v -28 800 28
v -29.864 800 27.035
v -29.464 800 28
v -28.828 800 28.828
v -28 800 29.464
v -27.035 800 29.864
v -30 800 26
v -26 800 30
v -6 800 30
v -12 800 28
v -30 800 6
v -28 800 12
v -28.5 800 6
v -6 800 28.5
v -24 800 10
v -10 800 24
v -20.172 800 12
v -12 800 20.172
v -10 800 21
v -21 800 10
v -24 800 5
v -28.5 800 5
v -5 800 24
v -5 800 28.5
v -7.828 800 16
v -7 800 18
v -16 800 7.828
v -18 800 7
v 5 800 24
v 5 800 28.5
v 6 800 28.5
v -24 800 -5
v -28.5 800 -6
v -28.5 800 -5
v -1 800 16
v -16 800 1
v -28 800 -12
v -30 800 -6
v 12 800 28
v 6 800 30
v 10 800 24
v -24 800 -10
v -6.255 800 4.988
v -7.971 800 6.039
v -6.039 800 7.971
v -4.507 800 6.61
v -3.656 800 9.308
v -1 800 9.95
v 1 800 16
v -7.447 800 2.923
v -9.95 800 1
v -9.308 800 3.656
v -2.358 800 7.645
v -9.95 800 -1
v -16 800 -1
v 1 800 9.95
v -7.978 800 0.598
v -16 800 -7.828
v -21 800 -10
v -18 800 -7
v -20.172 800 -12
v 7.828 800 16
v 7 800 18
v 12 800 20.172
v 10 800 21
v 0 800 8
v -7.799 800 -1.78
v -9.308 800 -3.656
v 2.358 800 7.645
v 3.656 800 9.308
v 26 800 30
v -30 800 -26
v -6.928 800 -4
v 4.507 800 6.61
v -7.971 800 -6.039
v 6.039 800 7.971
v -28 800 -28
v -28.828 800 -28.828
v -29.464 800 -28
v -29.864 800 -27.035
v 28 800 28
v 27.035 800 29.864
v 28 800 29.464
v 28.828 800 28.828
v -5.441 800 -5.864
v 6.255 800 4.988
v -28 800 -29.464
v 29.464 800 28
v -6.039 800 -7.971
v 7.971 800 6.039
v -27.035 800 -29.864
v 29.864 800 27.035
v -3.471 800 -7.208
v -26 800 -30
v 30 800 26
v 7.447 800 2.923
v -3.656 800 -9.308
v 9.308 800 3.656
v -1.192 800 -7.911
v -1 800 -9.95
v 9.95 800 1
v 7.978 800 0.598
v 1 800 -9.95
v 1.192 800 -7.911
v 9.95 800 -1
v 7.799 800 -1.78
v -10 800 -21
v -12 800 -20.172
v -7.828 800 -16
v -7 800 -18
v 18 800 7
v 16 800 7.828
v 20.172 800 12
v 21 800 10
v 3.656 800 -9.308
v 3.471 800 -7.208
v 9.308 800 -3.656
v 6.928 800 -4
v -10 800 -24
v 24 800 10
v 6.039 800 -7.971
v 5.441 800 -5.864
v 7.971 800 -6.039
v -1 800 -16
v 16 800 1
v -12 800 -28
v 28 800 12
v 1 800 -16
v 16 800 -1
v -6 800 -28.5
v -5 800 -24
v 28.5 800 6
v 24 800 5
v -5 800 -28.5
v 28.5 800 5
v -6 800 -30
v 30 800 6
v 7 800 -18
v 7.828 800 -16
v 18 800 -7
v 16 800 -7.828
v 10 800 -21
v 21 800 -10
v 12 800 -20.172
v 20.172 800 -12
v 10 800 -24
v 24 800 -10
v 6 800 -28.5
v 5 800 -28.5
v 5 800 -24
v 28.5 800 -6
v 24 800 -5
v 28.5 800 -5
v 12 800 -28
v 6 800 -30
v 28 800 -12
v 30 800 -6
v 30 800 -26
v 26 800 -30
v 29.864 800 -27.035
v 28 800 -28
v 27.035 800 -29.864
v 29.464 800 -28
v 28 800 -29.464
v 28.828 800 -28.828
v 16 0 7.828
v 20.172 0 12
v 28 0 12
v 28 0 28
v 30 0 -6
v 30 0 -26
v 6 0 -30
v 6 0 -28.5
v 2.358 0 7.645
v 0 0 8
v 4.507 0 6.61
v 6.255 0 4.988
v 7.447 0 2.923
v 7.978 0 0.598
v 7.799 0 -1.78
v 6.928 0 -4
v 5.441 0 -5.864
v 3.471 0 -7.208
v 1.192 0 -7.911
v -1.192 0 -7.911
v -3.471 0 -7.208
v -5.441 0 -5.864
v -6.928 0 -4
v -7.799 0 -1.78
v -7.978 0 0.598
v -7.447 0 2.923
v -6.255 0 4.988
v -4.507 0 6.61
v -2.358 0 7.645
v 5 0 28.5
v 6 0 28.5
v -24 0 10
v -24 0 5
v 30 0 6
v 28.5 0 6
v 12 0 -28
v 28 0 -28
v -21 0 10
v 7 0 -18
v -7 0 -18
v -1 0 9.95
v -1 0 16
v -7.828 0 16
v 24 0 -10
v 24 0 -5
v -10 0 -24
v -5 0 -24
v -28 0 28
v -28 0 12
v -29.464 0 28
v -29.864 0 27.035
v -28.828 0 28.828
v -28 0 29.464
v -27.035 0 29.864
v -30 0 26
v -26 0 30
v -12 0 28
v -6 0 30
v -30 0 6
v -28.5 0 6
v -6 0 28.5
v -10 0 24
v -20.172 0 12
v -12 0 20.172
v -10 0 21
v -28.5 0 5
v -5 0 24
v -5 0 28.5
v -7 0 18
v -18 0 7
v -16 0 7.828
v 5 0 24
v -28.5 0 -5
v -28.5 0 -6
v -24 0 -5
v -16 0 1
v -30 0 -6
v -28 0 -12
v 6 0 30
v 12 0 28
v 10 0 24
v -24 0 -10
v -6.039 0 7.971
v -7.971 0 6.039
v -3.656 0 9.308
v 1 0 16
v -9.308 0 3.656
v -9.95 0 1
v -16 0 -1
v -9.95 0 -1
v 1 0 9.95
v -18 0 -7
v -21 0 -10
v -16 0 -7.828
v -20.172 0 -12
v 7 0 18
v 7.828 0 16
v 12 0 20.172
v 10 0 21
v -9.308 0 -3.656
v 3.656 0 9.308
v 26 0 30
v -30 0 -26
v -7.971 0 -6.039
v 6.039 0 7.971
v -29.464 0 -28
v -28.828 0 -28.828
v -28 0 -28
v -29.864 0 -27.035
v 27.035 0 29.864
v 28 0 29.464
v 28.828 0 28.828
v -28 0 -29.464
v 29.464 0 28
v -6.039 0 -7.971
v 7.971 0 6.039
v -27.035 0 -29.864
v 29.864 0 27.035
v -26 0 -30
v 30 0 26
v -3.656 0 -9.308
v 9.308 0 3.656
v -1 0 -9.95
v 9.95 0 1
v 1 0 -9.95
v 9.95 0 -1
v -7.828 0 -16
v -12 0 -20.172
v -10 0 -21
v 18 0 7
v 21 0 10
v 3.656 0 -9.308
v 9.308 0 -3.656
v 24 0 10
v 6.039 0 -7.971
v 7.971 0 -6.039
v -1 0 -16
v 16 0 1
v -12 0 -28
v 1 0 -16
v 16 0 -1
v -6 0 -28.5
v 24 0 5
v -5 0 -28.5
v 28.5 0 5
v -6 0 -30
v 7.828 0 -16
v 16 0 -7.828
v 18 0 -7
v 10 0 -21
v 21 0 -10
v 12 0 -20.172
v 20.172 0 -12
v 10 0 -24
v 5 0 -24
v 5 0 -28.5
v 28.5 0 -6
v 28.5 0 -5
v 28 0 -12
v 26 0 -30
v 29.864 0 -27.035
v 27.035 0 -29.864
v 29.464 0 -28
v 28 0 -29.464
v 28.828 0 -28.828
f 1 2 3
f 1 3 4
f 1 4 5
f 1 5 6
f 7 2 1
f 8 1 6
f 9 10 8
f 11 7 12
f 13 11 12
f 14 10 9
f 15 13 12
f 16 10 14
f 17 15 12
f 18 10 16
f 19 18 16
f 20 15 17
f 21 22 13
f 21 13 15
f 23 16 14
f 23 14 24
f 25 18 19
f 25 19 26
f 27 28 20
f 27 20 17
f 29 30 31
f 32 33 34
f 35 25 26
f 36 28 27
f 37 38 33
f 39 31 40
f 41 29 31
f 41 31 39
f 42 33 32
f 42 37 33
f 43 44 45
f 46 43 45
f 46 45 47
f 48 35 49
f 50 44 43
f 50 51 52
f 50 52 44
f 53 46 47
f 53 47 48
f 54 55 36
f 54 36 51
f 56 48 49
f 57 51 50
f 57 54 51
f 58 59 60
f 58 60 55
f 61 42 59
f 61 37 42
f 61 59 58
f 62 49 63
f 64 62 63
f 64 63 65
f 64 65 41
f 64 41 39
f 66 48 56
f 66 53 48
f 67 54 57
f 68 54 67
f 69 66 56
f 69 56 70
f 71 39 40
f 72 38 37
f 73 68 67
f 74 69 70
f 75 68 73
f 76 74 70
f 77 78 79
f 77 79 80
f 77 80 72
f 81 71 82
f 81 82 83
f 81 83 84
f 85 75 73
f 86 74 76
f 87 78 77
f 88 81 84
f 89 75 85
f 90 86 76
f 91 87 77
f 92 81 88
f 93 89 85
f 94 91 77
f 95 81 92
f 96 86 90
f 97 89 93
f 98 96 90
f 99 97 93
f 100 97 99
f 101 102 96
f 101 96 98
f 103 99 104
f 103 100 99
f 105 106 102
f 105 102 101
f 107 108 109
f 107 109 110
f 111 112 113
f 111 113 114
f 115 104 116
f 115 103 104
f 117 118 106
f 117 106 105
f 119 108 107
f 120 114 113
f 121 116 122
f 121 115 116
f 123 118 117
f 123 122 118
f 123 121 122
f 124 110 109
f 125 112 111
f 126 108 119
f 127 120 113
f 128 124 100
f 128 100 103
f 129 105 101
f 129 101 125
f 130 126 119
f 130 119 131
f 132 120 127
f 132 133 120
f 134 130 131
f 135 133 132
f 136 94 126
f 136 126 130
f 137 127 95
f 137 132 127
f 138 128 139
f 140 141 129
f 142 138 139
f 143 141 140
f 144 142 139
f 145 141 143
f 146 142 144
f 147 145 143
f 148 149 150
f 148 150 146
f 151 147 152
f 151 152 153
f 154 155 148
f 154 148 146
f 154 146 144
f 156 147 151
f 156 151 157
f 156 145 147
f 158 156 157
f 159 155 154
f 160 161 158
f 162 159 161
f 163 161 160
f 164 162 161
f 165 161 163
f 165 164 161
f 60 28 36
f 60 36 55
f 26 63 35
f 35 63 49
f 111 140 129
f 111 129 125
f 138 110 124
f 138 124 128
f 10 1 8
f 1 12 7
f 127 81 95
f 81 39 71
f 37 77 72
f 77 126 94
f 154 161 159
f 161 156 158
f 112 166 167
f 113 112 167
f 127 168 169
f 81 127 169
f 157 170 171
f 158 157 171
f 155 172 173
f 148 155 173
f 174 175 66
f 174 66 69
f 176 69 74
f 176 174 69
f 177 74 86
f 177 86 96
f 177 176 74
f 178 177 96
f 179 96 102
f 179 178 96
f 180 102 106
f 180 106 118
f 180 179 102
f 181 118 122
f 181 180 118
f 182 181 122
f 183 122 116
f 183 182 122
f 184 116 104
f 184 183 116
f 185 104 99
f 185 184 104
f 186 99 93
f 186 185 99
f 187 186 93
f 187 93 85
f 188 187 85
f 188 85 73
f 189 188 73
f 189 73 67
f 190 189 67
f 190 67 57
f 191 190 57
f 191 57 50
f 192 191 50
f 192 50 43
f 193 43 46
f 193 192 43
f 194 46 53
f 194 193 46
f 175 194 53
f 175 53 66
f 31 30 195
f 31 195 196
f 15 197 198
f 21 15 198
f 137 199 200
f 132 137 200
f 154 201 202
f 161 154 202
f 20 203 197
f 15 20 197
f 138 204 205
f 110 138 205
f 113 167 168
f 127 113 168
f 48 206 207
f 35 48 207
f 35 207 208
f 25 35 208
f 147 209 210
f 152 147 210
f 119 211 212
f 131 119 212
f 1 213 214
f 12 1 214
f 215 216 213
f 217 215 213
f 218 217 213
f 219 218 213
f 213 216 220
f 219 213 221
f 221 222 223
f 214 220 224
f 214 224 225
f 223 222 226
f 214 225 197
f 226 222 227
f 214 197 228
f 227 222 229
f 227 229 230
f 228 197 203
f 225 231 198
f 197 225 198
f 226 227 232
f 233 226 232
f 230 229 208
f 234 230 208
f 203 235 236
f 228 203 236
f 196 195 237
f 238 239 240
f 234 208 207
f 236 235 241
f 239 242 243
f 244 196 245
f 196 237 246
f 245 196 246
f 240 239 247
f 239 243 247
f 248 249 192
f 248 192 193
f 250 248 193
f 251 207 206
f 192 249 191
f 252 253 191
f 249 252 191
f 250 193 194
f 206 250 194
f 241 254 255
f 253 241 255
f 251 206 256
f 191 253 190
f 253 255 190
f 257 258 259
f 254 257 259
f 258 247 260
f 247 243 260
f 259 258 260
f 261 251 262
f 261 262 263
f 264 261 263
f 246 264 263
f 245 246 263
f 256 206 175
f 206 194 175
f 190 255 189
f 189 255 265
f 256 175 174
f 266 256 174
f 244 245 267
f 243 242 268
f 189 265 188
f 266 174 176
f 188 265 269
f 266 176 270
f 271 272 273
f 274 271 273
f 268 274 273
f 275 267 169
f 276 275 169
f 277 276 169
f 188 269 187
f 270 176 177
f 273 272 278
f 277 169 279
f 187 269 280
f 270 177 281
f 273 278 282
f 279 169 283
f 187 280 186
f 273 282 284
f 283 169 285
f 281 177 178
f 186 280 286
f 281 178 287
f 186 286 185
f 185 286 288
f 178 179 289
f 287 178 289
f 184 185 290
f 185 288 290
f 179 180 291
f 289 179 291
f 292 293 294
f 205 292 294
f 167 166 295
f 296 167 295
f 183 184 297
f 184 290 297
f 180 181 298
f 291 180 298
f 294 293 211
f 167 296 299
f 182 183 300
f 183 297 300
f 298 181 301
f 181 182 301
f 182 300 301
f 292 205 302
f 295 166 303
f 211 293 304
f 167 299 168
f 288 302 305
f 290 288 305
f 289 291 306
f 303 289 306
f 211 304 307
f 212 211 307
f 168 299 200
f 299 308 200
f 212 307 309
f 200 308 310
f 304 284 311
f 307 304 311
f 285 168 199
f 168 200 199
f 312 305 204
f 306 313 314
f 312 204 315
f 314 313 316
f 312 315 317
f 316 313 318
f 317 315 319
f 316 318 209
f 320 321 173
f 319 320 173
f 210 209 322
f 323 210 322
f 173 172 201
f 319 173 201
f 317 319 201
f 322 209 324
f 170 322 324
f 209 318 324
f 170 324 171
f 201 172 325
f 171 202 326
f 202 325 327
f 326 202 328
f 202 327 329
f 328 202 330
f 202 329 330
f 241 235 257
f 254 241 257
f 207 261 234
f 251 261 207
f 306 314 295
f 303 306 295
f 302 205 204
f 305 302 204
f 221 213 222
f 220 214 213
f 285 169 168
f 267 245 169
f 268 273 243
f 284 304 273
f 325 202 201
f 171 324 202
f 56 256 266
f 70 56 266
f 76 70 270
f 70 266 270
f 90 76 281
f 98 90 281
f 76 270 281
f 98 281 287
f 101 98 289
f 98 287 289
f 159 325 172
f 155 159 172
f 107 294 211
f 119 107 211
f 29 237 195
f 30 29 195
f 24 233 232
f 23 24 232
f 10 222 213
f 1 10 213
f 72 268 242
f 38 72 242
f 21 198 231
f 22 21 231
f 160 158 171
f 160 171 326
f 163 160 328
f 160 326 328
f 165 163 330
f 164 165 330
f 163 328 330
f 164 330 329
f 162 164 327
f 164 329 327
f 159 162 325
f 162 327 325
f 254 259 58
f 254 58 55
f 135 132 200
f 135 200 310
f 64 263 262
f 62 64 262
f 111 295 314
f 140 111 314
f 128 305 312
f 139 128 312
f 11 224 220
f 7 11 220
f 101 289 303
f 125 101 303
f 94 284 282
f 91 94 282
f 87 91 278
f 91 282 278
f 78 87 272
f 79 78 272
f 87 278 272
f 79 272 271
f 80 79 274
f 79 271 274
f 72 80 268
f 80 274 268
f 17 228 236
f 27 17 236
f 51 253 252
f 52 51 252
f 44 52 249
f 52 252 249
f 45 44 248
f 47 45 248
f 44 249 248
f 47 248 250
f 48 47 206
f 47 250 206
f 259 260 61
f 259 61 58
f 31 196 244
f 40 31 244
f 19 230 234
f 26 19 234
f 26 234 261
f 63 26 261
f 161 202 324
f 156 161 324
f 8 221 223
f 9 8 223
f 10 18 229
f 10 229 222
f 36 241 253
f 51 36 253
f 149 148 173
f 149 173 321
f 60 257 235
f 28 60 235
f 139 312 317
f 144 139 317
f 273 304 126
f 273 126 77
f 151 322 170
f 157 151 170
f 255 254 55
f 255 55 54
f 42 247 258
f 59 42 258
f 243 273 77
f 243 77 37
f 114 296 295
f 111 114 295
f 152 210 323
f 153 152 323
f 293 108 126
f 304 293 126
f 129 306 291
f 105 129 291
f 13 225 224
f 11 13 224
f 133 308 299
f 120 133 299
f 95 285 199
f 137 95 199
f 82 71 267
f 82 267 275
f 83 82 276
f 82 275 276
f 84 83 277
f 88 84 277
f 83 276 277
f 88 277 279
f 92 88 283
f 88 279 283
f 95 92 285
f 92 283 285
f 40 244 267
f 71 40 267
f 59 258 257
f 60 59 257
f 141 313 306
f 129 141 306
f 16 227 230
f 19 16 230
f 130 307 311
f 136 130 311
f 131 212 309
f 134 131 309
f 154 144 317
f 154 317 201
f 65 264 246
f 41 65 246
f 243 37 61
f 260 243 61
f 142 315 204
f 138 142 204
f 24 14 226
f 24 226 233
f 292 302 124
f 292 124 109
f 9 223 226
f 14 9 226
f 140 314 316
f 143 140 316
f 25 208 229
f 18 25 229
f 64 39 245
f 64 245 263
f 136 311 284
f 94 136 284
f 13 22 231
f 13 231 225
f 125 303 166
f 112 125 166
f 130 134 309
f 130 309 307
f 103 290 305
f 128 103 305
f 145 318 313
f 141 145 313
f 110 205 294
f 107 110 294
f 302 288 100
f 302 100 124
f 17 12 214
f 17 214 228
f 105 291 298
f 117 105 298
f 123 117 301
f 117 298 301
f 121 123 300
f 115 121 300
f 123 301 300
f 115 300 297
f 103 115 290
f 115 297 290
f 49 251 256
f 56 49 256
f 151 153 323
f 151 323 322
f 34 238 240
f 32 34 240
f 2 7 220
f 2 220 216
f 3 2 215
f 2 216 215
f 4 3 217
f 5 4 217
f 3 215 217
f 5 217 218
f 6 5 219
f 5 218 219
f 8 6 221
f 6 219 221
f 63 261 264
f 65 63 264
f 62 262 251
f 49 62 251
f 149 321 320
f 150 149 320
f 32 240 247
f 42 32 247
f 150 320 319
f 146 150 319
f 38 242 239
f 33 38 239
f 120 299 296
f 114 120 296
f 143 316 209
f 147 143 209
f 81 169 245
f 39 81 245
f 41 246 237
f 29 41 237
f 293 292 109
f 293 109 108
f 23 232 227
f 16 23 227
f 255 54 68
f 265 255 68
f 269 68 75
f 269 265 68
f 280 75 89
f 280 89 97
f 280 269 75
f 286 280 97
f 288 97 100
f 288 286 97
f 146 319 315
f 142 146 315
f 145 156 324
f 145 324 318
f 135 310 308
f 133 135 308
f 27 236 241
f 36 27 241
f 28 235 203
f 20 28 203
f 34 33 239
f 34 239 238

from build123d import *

# Parameters (mm, degrees)
SKETCH_1_R      = 8
EXTRUDE_1_DEPTH = 800


with BuildPart() as part:
    # 草图1 → 凸台-拉伸1 (new body)
    with BuildSketch(Plane(origin=(0, 0, 0), x_dir=(1, 0, 0), z_dir=(0, 1, 0))):
        with BuildLine():
            Line((-30, 5.999999999), (-28.5, 5.999999999))
            Line((-28.5, 5.999999999), (-28.5, 4.999999999))
            Line((-28.5, 4.999999999), (-24, 4.999999999))
            Line((-24, 4.999999999), (-24, 9.999999999))
            Line((-24, 9.999999999), (-21, 9.999999999))
            Line((-21, 9.999999999), (-18, 6.999999999))
            Line((-18, 6.999999999), (-18, -7.000000001))
            Line((-18, -7.000000001), (-21, -10.000000001))
            Line((-21, -10.000000001), (-24, -10.000000001))
            Line((-24, -10.000000001), (-24, -5.000000001))
            Line((-24, -5.000000001), (-28.5, -5.000000001))
            Line((-28.5, -5.000000001), (-28.5, -6.000000001))
            Line((-28.5, -6.000000001), (-30, -6.000000001))
            Line((-30, -6.000000001), (-30, -26.000000001))
            ThreePointArc((-30, -26.000000001), (-28.828427125, -28.828427126), (-26, -30.000000001))
            Line((-26, -30.000000001), (-6, -30.000000001))
            Line((-6, -30.000000001), (-6, -28.500000001))
            Line((-6, -28.500000001), (-5, -28.500000001))
            Line((-5, -28.500000001), (-5, -24.000000001))
            Line((-5, -24.000000001), (-10, -24.000000001))
            Line((-10, -24.000000001), (-10, -21.000000001))
            Line((-10, -21.000000001), (-7, -18.000000001))
            Line((-7, -18.000000001), (7, -18.000000001))
            Line((7, -18.000000001), (10, -21.000000001))
            Line((10, -21.000000001), (10, -24.000000001))
            Line((10, -24.000000001), (5, -24.000000001))
            Line((5, -24.000000001), (5, -28.500000001))
            Line((5, -28.500000001), (6, -28.500000001))
            Line((6, -28.500000001), (6, -30.000000001))
            Line((6, -30.000000001), (26, -30.000000001))
            ThreePointArc((26, -30.000000001), (28.828427125, -28.828427126), (30, -26.000000001))
            Line((30, -26.000000001), (30, -6.000000001))
            Line((30, -6.000000001), (28.5, -6.000000001))
            Line((28.5, -6.000000001), (28.5, -5.000000001))
            Line((28.5, -5.000000001), (24, -5.000000001))
            Line((24, -5.000000001), (24, -10.000000001))
            Line((24, -10.000000001), (21, -10.000000001))
            Line((21, -10.000000001), (18, -7.000000001))
            Line((18, -7.000000001), (18, 6.999999999))
            Line((18, 6.999999999), (21, 9.999999999))
            Line((21, 9.999999999), (24, 9.999999999))
            Line((24, 9.999999999), (24, 4.999999999))
            Line((24, 4.999999999), (28.5, 4.999999999))
            Line((28.5, 4.999999999), (28.5, 5.999999999))
            Line((28.5, 5.999999999), (30, 5.999999999))
            Line((30, 5.999999999), (30, 25.999999999))
            ThreePointArc((30, 25.999999999), (28.828427125, 28.828427124), (26, 29.999999999))
            Line((26, 29.999999999), (6, 29.999999999))
            Line((6, 29.999999999), (6, 28.499999999))
            Line((6, 28.499999999), (5, 28.499999999))
            Line((5, 28.499999999), (5, 23.999999999))
            Line((5, 23.999999999), (10, 23.999999999))
            Line((10, 23.999999999), (10, 20.999999999))
            Line((10, 20.999999999), (7, 17.999999999))
            Line((7, 17.999999999), (-7, 17.999999999))
            Line((-7, 17.999999999), (-10, 20.999999999))
            Line((-10, 20.999999999), (-10, 23.999999999))
            Line((-10, 23.999999999), (-5, 23.999999999))
            Line((-5, 23.999999999), (-5, 28.499999999))
            Line((-5, 28.499999999), (-6, 28.499999999))
            Line((-6, 28.499999999), (-6, 29.999999999))
            Line((-6, 29.999999999), (-26.000000001, 29.999999999))
            ThreePointArc((-26.000000001, 29.999999999), (-28.828427125, 28.828427123), (-30, 25.999999999))
            Line((-30, 25.999999999), (-30, 5.999999999))
        make_face()
        with Locations(Location((0, 0, 0), (0, 0, 270))):
            Circle(SKETCH_1_R, mode=Mode.SUBTRACT)
        with BuildLine():
            Line((-16, 1), (-9.949874371, 1))
            ThreePointArc((-9.949874371, 1), (-7.071067812, 7.071067811), (-1.000000001, 9.949874371))
            Line((-1.000000001, 9.949874371), (-1.000000001, 16))
            Line((-1.000000001, 16), (-7.828427125, 16))
            Line((-7.828427125, 16), (-12, 20.171572875))
            Line((-12, 20.171572875), (-12, 28))
            Line((-12, 28), (-28, 28))
            Line((-28, 28), (-28, 12))
            Line((-28, 12), (-20.171572875, 12))
            Line((-20.171572875, 12), (-16, 7.828427125))
            Line((-16, 7.828427125), (-16, 1))
        make_face(mode=Mode.SUBTRACT)
        with BuildLine():
            Line((1, 9.949874371), (1, 16))
            Line((1, 16), (7.828427125, 16))
            Line((7.828427125, 16), (12, 20.171572875))
            Line((12, 20.171572875), (12, 28))
            Line((12, 28), (28, 28))
            Line((28, 28), (28, 12.000000001))
            Line((28, 12.000000001), (20.171572875, 12.000000001))
            Line((20.171572875, 12.000000001), (16, 7.828427126))
            Line((16, 7.828427126), (16, 1.000000001))
            Line((16, 1.000000001), (9.949874371, 1.000000001))
            ThreePointArc((9.949874371, 1.000000001), (7.071067811, 7.071067812), (1, 9.949874371))
        make_face(mode=Mode.SUBTRACT)
        with BuildLine():
            Line((9.949874371, -1), (16, -1))
            Line((16, -1), (16, -7.828427125))
            Line((16, -7.828427125), (20.171572875, -12))
            Line((20.171572875, -12), (28.000000001, -12))
            Line((28.000000001, -12), (28.000000001, -28))
            Line((28.000000001, -28), (12.000000001, -28))
            Line((12.000000001, -28), (12.000000001, -20.171572875))
            Line((12.000000001, -20.171572875), (7.828427126, -16))
            Line((7.828427126, -16), (1.000000001, -16))
            Line((1.000000001, -16), (1.000000001, -9.949874371))
            ThreePointArc((1.000000001, -9.949874371), (7.071067812, -7.071067811), (9.949874371, -1))
        make_face(mode=Mode.SUBTRACT)
        with BuildLine():
            Line((-1, -9.949874371), (-1, -16.000000001))
            Line((-1, -16.000000001), (-7.828427125, -16.000000001))
            Line((-7.828427125, -16.000000001), (-12, -20.171572876))
            Line((-12, -20.171572876), (-12, -28.000000001))
            Line((-12, -28.000000001), (-28, -28.000000001))
            Line((-28, -28.000000001), (-28, -12.000000001))
            Line((-28, -12.000000001), (-20.171572875, -12.000000001))
            Line((-20.171572875, -12.000000001), (-16, -7.828427126))
            Line((-16, -7.828427126), (-16, -1.000000001))
            Line((-16, -1.000000001), (-9.949874371, -1.000000001))
            ThreePointArc((-9.949874371, -1.000000001), (-7.071067811, -7.071067812), (-1, -9.949874371))
        make_face(mode=Mode.SUBTRACT)
    extrude(amount=EXTRUDE_1_DEPTH)


solid = part.part
